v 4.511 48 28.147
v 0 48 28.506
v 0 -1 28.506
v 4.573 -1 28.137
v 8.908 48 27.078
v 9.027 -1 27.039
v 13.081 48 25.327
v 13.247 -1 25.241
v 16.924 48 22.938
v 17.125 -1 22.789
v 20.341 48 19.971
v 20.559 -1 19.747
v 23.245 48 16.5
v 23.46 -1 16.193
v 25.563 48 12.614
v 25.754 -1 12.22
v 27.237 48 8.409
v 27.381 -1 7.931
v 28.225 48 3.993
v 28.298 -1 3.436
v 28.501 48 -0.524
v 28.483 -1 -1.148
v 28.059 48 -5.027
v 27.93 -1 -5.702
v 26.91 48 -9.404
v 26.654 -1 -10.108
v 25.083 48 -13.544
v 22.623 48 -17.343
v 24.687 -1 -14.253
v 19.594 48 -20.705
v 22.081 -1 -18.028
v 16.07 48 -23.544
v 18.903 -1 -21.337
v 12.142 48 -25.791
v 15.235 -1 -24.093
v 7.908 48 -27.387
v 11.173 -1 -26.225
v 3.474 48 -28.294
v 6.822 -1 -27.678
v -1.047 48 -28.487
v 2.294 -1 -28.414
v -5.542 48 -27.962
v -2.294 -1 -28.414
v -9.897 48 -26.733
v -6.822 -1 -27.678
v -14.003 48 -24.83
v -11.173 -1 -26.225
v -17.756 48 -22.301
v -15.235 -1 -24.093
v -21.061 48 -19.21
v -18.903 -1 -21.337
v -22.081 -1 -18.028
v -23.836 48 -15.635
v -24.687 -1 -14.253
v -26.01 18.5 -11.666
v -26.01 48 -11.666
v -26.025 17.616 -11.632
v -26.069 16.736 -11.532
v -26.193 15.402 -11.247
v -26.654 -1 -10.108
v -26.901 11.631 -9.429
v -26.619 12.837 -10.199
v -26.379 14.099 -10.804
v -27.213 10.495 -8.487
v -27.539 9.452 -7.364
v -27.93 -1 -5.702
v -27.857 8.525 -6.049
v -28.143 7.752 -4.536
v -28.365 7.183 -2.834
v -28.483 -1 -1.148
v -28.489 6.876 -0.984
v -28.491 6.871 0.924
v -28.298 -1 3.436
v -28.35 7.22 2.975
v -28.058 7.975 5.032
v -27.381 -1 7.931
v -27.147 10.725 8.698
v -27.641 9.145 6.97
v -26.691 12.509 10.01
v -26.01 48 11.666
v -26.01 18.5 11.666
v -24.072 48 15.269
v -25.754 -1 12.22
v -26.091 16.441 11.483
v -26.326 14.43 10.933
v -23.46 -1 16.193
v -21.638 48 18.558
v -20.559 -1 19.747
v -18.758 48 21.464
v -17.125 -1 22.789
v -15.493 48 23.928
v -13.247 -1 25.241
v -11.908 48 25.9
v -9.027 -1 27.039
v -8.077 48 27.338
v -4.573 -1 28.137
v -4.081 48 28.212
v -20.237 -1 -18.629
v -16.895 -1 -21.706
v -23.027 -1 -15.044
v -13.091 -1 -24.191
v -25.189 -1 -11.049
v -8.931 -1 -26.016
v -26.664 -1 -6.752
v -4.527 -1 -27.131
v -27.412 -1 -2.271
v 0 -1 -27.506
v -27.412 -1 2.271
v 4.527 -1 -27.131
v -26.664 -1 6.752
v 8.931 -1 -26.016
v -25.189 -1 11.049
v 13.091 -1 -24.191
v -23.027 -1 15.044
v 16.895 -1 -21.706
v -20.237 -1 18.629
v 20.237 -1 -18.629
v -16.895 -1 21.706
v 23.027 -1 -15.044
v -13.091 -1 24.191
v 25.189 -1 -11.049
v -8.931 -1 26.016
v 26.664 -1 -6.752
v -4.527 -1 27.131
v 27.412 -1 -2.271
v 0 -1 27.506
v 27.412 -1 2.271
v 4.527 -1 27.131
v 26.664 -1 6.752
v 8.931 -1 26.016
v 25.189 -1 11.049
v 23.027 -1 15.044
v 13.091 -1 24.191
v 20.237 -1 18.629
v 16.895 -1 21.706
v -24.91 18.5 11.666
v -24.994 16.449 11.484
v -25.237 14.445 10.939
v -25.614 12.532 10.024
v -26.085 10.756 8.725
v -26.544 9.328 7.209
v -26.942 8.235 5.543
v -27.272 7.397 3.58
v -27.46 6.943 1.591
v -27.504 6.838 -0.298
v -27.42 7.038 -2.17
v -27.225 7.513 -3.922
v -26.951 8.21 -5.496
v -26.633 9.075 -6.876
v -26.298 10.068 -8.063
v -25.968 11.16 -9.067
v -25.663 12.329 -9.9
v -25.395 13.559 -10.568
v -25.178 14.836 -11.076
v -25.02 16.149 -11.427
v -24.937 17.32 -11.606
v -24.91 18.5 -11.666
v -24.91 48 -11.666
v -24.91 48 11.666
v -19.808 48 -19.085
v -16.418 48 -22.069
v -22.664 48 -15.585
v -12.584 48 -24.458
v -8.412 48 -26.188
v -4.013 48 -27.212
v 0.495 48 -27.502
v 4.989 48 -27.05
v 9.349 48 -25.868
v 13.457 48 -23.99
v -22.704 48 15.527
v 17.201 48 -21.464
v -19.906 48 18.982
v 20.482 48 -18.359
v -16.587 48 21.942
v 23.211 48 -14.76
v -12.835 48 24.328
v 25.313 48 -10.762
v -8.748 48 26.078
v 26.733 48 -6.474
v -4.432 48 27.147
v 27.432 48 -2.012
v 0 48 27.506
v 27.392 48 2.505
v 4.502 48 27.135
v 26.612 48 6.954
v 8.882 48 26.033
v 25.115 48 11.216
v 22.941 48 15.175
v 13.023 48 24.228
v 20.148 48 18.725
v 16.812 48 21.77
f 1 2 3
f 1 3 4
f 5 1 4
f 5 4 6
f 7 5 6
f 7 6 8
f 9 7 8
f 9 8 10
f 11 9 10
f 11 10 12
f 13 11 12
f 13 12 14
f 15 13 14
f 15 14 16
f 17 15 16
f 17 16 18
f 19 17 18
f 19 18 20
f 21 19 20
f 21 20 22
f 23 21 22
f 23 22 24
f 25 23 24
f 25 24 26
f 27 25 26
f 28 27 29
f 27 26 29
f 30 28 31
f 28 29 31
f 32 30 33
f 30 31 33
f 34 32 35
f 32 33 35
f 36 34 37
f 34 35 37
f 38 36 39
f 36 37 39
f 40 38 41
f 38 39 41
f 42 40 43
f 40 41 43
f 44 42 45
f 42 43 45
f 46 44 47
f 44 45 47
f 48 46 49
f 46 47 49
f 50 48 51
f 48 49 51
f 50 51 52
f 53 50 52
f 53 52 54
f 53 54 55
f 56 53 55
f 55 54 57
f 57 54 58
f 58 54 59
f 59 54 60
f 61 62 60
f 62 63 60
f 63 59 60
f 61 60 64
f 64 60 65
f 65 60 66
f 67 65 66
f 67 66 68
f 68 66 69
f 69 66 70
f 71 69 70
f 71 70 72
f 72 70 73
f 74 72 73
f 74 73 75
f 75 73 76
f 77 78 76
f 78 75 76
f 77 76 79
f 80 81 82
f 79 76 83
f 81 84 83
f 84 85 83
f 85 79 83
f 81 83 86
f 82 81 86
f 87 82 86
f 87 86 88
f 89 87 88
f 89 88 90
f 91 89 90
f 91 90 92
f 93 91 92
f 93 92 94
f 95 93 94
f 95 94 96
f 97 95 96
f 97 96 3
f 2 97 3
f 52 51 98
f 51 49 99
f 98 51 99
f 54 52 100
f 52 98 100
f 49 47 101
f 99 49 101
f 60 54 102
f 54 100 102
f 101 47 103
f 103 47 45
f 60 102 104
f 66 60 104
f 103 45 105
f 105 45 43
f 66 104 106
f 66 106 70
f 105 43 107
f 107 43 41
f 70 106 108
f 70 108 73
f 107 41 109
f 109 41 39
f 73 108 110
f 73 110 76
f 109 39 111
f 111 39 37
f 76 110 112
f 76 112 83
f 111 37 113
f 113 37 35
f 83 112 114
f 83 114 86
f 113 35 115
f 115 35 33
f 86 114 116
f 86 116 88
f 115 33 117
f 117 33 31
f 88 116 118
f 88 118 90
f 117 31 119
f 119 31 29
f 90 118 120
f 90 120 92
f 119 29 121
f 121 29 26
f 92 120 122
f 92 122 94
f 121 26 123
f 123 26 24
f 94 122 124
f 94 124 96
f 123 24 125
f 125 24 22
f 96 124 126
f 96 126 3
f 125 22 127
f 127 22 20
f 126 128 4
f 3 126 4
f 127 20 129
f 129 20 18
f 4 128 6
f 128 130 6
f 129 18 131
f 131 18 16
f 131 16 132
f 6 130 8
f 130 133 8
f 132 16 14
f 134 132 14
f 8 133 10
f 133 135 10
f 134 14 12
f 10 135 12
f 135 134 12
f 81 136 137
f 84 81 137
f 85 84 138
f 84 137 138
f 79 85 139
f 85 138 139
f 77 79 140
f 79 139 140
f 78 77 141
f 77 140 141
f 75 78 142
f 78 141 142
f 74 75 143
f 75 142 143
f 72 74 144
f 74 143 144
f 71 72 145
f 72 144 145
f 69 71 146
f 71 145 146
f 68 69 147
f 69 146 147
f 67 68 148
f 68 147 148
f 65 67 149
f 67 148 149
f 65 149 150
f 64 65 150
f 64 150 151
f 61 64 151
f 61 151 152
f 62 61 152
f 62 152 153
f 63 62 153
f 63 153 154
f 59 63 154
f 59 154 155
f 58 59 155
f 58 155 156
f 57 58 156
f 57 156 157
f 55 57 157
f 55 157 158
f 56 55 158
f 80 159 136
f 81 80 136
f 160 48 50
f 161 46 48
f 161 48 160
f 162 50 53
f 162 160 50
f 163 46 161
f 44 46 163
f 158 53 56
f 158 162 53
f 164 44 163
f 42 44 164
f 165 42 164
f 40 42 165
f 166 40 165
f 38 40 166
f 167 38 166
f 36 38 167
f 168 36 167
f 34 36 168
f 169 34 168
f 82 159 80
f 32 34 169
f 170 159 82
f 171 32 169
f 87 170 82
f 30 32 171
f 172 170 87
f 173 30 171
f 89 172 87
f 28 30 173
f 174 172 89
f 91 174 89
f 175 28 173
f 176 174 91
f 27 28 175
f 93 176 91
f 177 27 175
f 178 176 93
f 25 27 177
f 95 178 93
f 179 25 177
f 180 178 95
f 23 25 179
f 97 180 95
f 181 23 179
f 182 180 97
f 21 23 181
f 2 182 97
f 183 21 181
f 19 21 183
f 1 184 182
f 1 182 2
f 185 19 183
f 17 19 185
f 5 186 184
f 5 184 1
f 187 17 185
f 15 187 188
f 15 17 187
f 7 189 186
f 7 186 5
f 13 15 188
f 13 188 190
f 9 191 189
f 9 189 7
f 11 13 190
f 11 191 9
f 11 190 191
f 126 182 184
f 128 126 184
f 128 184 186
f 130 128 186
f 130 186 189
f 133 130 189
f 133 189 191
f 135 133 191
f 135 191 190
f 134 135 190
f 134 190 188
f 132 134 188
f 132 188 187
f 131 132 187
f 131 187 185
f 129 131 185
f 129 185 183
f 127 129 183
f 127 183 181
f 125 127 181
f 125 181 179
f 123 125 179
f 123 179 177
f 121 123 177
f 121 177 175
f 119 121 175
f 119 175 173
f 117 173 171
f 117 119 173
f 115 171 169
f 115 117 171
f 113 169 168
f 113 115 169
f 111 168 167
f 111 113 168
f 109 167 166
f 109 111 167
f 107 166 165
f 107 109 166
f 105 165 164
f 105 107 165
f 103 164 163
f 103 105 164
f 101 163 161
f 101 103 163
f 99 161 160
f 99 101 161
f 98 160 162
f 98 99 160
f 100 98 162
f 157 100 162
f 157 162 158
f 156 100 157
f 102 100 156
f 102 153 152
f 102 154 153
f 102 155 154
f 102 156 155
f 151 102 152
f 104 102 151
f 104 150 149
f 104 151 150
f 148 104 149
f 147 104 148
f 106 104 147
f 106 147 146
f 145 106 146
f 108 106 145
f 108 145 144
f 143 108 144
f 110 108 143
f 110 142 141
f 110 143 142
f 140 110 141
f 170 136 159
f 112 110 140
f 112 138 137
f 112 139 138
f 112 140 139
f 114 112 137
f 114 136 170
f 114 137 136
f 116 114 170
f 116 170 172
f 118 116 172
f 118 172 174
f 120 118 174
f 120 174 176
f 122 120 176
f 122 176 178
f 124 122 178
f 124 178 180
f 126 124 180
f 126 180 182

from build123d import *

# Parameters (mm, degrees)
BOSS_EXTRUDE1_DEPTH      = 48
BOSS_EXTRUDE1_DEPTH_BACK = 1
SKETCH1_R                = 28.506
SKETCH1_R_2              = 27.506
CUT_EXTRUDE1_DEPTH       = 48


with BuildPart() as part:
    # Sketch1 → Boss-Extrude1 (new, two sides: drawn at the far end of the back side and taken through both)
    with BuildSketch(Plane(origin=(0, 0, 0), x_dir=(1, 0, 0), z_dir=(0, 1, 0)).offset(-BOSS_EXTRUDE1_DEPTH_BACK)):
        with Locations(Location((0, 0, 0), (0, 0, 270))):
            Circle(SKETCH1_R)
        with Locations(Location((0, 0, 0), (0, 0, 270))):
            Circle(SKETCH1_R_2, mode=Mode.SUBTRACT)
    extrude(amount=BOSS_EXTRUDE1_DEPTH + BOSS_EXTRUDE1_DEPTH_BACK)

    # Sketch2 → Cut-Extrude1 (cut)
    with BuildSketch(Plane(origin=(0, 0, 0), x_dir=(0, 0, -1), z_dir=(1, 0, 0))):
        with BuildLine():
            Line((11.666, 18.5), (11.666, 48))
            Line((11.666, 48), (-11.666, 48))
            Line((-11.666, 48), (-11.666, 18.5))
            ThreePointArc((-11.666, 18.5), (0, 6.834), (11.666, 18.5))
        make_face()
    extrude(amount=-CUT_EXTRUDE1_DEPTH, mode=Mode.SUBTRACT)


solid = part.part
